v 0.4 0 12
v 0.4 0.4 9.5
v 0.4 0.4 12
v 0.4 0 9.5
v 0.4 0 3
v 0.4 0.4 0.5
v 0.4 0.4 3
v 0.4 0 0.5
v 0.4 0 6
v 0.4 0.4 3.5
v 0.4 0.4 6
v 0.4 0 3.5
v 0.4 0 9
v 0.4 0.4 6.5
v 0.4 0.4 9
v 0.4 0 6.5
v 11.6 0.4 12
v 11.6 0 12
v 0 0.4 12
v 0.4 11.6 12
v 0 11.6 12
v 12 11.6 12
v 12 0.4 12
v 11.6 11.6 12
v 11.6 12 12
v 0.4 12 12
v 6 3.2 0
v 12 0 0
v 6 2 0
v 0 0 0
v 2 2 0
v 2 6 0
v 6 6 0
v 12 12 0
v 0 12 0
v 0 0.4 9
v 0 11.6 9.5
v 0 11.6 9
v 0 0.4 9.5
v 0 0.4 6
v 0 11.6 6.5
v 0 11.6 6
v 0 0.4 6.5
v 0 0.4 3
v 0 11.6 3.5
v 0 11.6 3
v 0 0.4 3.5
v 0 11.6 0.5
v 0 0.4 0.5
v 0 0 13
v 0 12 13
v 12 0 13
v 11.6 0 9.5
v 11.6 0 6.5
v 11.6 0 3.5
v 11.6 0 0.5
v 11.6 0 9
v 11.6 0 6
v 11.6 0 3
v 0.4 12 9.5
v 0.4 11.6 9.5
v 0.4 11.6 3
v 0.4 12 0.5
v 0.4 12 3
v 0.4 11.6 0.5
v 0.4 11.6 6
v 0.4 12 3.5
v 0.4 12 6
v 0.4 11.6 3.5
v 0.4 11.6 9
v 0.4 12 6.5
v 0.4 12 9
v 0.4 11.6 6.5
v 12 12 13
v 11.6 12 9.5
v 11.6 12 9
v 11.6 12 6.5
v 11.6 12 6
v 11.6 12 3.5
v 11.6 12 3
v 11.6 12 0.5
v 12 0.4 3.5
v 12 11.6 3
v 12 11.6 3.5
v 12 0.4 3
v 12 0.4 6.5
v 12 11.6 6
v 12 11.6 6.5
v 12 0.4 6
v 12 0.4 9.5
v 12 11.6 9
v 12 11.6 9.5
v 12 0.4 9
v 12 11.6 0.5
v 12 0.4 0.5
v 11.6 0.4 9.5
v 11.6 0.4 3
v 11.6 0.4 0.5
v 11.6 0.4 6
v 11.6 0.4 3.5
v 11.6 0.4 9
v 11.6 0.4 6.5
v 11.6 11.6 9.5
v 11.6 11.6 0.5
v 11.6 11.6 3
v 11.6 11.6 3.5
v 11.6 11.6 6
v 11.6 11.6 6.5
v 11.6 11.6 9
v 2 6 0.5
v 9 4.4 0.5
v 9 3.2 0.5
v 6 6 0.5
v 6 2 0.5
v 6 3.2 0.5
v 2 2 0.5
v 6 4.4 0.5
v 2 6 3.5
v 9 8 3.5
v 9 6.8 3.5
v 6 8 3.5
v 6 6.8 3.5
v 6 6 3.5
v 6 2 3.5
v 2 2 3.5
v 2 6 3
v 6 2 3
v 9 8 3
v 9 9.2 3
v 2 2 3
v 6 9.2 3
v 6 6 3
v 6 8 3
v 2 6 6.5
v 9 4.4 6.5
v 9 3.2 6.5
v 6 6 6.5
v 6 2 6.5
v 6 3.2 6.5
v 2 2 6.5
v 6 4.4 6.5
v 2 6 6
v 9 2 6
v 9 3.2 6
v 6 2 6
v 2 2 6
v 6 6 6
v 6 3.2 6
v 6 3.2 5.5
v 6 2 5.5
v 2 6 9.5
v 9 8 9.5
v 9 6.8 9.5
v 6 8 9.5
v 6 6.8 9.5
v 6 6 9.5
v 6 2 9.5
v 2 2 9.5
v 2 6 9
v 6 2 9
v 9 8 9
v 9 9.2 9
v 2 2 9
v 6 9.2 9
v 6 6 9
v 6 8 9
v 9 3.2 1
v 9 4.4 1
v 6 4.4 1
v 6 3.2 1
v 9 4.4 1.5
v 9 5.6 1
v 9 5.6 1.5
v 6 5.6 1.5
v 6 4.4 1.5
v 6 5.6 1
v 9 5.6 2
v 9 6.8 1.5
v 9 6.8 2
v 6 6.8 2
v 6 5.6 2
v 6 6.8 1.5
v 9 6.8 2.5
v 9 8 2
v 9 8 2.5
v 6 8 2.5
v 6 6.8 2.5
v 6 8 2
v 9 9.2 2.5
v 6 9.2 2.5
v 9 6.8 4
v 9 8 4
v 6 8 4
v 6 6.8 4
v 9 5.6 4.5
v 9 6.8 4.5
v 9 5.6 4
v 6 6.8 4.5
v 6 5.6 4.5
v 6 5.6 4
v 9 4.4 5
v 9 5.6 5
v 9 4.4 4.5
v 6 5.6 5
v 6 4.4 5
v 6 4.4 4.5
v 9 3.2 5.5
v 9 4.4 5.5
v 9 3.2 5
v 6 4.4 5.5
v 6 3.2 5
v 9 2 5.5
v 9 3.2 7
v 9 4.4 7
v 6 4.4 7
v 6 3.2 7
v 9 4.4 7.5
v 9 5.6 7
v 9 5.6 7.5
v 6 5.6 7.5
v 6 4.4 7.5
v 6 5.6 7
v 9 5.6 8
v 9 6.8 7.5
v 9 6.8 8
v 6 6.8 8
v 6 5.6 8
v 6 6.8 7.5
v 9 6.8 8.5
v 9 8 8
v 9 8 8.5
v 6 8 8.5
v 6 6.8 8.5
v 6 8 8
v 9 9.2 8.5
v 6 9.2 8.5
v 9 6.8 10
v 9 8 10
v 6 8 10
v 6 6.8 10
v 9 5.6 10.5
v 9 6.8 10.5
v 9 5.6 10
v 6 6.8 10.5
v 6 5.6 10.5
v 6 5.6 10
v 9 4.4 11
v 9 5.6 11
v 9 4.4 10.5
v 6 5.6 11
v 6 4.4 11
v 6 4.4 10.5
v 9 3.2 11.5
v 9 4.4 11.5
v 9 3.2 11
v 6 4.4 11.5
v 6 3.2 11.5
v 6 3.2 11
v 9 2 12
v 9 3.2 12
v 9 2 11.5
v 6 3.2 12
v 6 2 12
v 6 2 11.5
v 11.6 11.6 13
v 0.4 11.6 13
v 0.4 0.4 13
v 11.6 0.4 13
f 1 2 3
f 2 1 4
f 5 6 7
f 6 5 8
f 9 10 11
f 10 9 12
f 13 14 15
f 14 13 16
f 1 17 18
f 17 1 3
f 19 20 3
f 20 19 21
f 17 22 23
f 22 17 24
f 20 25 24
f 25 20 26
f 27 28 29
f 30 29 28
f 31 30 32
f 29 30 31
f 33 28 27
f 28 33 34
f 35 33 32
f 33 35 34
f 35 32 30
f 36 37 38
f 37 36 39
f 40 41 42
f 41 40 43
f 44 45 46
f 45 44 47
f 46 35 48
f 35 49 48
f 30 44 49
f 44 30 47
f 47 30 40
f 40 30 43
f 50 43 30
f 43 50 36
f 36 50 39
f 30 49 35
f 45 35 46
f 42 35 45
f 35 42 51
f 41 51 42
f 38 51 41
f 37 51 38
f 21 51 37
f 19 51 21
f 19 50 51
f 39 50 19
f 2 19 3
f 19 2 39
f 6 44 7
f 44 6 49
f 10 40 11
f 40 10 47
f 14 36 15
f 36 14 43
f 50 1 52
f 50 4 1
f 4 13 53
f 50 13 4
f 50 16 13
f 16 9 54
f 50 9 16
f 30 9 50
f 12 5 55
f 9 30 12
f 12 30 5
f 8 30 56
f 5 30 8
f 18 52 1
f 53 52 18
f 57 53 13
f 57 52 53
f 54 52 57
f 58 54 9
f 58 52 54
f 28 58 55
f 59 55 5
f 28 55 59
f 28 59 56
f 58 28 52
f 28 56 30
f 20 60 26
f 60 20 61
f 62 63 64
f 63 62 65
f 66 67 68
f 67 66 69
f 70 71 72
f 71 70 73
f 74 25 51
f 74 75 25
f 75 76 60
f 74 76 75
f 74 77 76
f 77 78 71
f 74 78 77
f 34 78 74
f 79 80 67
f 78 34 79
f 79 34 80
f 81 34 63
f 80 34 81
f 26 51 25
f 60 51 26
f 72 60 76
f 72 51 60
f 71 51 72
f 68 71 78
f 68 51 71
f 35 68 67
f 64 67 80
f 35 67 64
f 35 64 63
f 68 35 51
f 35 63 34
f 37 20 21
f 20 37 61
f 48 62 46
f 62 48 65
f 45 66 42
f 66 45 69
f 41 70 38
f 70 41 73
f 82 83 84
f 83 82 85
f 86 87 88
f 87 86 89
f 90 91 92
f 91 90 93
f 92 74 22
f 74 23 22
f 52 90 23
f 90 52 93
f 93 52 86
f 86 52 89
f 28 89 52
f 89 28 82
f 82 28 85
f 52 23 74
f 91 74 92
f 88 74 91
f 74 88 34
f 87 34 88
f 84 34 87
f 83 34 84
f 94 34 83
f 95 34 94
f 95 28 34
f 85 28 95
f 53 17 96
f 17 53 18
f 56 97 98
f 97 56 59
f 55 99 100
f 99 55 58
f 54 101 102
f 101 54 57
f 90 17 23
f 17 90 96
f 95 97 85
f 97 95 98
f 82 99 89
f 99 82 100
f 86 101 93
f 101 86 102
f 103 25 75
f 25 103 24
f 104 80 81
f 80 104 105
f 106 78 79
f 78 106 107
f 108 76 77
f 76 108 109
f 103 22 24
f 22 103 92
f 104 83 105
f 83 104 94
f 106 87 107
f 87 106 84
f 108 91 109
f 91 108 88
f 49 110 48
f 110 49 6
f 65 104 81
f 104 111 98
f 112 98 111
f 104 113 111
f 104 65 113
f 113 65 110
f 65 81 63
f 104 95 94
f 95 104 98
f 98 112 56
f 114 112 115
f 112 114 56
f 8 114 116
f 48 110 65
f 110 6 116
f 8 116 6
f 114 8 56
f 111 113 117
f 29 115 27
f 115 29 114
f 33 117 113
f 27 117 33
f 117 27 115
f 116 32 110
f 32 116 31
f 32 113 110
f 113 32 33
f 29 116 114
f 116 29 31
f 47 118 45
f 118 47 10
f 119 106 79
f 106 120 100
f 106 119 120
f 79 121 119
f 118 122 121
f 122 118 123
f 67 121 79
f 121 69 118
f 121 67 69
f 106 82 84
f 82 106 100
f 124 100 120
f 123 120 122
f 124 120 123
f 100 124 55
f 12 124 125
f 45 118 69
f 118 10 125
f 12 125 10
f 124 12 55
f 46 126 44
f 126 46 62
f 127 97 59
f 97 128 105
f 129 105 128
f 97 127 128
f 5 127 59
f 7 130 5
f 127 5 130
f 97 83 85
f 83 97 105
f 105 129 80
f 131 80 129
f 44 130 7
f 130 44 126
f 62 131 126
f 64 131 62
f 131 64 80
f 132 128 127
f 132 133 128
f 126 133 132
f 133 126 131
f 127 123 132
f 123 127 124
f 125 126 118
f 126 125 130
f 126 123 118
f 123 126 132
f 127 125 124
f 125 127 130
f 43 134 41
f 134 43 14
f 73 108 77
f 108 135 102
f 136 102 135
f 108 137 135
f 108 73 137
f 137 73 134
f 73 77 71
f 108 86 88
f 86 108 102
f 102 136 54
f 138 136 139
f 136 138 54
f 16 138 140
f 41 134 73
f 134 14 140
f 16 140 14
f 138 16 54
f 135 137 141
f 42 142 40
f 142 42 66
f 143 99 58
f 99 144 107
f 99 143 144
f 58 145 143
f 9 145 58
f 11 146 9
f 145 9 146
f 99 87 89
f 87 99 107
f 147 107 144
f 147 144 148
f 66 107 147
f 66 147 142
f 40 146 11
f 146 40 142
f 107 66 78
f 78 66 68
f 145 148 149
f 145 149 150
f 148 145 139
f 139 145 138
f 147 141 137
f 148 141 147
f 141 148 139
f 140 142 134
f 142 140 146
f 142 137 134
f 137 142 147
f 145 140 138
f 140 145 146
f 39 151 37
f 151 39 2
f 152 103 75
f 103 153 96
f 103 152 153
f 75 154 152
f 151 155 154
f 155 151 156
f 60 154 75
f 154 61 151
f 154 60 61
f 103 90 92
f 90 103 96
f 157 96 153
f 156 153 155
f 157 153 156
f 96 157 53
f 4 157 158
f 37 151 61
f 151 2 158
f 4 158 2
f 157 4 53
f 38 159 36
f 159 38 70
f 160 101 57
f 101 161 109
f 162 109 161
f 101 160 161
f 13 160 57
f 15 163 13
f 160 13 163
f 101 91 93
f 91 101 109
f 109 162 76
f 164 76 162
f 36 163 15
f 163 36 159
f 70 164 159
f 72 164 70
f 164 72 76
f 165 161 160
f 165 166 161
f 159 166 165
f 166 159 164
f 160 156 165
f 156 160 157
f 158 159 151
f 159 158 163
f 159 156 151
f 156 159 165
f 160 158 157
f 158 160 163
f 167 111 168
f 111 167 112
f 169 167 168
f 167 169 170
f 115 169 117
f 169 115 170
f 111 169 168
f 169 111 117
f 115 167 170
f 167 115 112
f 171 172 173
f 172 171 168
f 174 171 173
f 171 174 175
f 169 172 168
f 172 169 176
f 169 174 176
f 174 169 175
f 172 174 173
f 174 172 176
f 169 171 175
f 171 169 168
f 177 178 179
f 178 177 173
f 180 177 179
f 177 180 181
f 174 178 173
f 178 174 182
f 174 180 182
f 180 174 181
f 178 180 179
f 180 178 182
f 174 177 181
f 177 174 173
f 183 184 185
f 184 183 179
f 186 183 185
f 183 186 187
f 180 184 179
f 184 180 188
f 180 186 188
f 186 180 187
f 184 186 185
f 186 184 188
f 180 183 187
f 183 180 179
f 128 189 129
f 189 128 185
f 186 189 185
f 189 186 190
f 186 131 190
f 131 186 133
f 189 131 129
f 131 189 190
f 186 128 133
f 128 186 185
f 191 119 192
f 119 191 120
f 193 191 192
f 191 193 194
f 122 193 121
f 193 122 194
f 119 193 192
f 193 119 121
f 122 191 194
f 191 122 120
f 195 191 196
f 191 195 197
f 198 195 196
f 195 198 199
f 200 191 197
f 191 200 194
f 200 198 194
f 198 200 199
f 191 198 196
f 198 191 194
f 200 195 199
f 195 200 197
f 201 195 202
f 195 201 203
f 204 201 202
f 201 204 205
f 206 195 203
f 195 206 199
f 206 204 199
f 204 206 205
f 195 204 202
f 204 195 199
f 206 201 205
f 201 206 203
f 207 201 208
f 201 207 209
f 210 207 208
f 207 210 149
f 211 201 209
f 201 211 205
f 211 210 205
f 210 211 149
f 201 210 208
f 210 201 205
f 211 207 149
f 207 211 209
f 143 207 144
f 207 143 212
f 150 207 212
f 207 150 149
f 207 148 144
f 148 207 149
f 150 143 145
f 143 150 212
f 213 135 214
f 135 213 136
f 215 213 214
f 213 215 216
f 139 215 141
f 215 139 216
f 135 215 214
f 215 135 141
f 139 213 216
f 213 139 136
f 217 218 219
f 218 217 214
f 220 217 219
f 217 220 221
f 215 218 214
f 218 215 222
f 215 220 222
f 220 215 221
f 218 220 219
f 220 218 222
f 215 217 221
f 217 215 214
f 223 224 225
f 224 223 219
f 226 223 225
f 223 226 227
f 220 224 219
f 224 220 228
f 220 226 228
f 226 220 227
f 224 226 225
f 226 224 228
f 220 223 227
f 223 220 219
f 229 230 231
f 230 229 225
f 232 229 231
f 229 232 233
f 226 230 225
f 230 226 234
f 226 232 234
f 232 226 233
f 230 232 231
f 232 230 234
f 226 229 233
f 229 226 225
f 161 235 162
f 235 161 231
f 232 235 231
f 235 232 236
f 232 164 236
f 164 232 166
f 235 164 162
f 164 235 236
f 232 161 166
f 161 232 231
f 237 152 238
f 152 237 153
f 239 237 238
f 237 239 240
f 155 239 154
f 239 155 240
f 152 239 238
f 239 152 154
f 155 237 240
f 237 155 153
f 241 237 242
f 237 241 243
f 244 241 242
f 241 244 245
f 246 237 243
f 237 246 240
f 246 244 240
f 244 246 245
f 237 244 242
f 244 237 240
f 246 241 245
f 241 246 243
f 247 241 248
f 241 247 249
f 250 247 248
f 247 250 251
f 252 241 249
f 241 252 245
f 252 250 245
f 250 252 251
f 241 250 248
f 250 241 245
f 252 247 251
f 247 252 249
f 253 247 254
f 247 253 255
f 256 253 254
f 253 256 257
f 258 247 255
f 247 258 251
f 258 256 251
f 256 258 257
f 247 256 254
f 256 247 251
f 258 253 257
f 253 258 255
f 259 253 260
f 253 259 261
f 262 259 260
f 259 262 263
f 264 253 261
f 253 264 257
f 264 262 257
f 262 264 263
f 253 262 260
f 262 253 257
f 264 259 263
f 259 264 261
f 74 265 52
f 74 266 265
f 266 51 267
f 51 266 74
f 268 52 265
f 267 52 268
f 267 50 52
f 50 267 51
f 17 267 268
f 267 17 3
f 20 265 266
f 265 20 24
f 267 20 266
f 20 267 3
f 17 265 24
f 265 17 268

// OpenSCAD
// 可进入楼梯塔 - 多层中空平台 + 直跑楼梯 (纯垂直机动, 玩家层层爬升)
// 平台 12(x) × 12(y), 层高 3, 共 4 层, 总高 12
// 每层平台挖楼梯井留空, 楼梯段交替方向连层

module platform(z) {
  difference() {
    translate([0, 0, z]) cube([12, 12, 0.5]);
    // 楼梯井留空 (中部偏一侧)
    translate([2, 2, z]) cube([4, 4, 0.6]);
  }
}

module posts() {
  for (px = [0, 11.6]) for (py = [0, 11.6]) {
    translate([px, py, 0]) cube([0.4, 0.4, 12]);
  }
}

module stair_run(z0, flip) {
  // 一段直跑楼梯 (6 级, 每级升 0.5)
  for (i = [0 : 1 : 5]) {
    translate([6, 2 + (flip ? (5 - i) : i) * 1.2, z0 + i * 0.5]) cube([3, 1.2, 0.5]);
  }
}

color("#7a7a72") posts();
color("#9a9a90") for (z = [0, 3, 6, 9]) platform(z);
color("#6b6b63") stair_run(0, false);
color("#6b6b63") stair_run(3, true);
color("#6b6b63") stair_run(6, false);
color("#6b6b63") stair_run(9, true);
// 顶护栏
color("#55554f") translate([0, 0, 12]) {
  cube([12, 0.4, 1]);
  translate([0, 11.6, 0]) cube([12, 0.4, 1]);
  cube([0.4, 12, 1]);
  translate([11.6, 0, 0]) cube([0.4, 12, 1]);
}
